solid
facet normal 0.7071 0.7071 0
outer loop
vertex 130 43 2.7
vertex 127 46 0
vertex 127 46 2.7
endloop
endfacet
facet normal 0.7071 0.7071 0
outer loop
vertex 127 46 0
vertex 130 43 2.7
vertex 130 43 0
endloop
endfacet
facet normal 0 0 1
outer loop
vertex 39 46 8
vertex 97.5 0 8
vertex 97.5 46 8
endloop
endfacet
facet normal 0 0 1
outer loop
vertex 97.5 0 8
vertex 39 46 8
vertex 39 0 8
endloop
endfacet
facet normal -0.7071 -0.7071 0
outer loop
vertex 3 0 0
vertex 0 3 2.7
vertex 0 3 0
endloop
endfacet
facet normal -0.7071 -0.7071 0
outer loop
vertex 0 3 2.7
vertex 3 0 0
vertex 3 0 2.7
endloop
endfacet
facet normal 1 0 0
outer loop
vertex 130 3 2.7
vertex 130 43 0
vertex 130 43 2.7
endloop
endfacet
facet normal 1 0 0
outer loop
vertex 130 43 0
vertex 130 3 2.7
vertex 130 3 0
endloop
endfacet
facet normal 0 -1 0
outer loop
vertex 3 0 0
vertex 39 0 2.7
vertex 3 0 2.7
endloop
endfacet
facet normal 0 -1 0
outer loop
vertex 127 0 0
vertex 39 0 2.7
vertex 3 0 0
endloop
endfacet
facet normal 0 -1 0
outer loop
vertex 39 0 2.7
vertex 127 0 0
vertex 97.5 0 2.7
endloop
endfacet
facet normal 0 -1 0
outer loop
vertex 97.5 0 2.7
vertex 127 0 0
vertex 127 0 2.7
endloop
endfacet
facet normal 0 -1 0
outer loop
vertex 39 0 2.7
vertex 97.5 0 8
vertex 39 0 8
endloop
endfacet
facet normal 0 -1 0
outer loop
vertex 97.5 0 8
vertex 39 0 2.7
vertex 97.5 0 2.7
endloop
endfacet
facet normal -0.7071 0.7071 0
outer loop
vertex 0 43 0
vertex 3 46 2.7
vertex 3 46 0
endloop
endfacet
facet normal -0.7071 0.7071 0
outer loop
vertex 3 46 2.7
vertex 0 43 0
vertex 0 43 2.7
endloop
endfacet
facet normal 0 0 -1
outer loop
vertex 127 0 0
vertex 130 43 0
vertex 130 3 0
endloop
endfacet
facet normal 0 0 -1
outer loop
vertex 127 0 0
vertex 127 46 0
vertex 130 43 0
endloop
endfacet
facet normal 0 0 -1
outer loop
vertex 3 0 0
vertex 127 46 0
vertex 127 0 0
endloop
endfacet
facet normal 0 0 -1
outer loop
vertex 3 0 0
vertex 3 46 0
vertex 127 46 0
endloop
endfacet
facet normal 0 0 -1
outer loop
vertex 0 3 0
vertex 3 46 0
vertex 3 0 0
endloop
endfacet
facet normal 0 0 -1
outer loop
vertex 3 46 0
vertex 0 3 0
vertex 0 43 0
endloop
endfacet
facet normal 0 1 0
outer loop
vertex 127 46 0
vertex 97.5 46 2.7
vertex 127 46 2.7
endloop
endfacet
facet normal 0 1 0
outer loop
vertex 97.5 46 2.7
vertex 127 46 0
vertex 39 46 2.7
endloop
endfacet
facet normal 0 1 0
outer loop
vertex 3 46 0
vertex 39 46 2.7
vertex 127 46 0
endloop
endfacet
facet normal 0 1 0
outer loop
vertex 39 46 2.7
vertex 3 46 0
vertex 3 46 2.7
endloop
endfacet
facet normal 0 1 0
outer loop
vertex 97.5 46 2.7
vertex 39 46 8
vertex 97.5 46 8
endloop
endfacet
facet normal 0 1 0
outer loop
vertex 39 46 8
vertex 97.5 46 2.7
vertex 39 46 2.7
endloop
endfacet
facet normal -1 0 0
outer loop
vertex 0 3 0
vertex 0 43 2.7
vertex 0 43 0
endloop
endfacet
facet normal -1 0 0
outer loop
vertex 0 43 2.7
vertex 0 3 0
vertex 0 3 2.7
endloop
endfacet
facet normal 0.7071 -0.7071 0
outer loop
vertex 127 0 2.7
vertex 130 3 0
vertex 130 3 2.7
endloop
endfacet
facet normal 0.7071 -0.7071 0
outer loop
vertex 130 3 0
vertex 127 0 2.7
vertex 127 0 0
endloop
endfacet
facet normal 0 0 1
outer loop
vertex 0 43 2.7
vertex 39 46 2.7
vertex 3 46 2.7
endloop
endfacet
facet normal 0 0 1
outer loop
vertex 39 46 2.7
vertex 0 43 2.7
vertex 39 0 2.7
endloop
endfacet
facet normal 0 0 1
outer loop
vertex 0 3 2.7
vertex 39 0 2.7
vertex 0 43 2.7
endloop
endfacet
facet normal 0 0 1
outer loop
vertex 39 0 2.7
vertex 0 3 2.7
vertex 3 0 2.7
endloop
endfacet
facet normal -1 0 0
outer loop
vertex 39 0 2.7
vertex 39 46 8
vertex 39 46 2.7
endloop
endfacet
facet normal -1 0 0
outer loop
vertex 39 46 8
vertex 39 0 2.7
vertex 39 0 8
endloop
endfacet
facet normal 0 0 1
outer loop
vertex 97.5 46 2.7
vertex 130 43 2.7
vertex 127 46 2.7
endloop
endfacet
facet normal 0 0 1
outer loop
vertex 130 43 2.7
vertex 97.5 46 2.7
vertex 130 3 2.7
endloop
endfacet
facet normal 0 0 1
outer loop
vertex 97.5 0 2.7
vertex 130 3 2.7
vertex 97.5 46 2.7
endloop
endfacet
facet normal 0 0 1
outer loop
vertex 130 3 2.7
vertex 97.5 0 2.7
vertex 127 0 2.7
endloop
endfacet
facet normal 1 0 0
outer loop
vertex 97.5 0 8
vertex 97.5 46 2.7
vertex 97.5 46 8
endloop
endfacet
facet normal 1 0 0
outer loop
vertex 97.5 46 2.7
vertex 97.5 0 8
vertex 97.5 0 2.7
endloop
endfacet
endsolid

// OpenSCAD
$fn = 32;

// ----------------------------------------------------------------------
// Stepped bar: centerstep, 130 x 46 x 8/2.7 mm
// ----------------------------------------------------------------------

// --- parameters (mm) ---
bar_l = 130;              // bar length, X
bar_w = 46;               // bar width, Y
plate_t = 8;              // thickness of the thick zone, Z
thin_t = 2.7;             // thickness of the thin zone
corner_c = 3;             // corner chamfer of the bar
step_cut = 5.3;           // material removed from the thin zone
thick_from = 39;          // start of the thick middle zone
thick_to = 97.5;          // end of the thick middle zone
depth_1 = 5.3;            // depth of cut 1 from the top face
depth_2 = 5.3;            // depth of cut 2 from the top face
fit_tol = 0.05;           // declared fit tolerance (prompt contract)
free_tol = 0.2;           // declared free tolerance (prompt contract)

profile = [[3, 0], [127, 0], [130, 3], [130, 43], [127, 46], [3, 46], [0, 43], [0, 3]];  // primary outline, 8 points, counter clockwise
void_1 = [[-1, -1], [39, -1], [39, 47], [-1, 47]];  // thin left end, 4 points
void_2 = [[97.5, -1], [131, -1], [131, 47], [97.5, 47]];  // thin right end, 4 points

// --- the one profile operation ---
difference() {
  linear_extrude(height = plate_t) polygon(points = profile);
  translate([0, 0, plate_t - depth_1])
    linear_extrude(height = depth_1 + 1) polygon(points = void_1);
  translate([0, 0, plate_t - depth_2])
    linear_extrude(height = depth_2 + 1) polygon(points = void_2);
}
